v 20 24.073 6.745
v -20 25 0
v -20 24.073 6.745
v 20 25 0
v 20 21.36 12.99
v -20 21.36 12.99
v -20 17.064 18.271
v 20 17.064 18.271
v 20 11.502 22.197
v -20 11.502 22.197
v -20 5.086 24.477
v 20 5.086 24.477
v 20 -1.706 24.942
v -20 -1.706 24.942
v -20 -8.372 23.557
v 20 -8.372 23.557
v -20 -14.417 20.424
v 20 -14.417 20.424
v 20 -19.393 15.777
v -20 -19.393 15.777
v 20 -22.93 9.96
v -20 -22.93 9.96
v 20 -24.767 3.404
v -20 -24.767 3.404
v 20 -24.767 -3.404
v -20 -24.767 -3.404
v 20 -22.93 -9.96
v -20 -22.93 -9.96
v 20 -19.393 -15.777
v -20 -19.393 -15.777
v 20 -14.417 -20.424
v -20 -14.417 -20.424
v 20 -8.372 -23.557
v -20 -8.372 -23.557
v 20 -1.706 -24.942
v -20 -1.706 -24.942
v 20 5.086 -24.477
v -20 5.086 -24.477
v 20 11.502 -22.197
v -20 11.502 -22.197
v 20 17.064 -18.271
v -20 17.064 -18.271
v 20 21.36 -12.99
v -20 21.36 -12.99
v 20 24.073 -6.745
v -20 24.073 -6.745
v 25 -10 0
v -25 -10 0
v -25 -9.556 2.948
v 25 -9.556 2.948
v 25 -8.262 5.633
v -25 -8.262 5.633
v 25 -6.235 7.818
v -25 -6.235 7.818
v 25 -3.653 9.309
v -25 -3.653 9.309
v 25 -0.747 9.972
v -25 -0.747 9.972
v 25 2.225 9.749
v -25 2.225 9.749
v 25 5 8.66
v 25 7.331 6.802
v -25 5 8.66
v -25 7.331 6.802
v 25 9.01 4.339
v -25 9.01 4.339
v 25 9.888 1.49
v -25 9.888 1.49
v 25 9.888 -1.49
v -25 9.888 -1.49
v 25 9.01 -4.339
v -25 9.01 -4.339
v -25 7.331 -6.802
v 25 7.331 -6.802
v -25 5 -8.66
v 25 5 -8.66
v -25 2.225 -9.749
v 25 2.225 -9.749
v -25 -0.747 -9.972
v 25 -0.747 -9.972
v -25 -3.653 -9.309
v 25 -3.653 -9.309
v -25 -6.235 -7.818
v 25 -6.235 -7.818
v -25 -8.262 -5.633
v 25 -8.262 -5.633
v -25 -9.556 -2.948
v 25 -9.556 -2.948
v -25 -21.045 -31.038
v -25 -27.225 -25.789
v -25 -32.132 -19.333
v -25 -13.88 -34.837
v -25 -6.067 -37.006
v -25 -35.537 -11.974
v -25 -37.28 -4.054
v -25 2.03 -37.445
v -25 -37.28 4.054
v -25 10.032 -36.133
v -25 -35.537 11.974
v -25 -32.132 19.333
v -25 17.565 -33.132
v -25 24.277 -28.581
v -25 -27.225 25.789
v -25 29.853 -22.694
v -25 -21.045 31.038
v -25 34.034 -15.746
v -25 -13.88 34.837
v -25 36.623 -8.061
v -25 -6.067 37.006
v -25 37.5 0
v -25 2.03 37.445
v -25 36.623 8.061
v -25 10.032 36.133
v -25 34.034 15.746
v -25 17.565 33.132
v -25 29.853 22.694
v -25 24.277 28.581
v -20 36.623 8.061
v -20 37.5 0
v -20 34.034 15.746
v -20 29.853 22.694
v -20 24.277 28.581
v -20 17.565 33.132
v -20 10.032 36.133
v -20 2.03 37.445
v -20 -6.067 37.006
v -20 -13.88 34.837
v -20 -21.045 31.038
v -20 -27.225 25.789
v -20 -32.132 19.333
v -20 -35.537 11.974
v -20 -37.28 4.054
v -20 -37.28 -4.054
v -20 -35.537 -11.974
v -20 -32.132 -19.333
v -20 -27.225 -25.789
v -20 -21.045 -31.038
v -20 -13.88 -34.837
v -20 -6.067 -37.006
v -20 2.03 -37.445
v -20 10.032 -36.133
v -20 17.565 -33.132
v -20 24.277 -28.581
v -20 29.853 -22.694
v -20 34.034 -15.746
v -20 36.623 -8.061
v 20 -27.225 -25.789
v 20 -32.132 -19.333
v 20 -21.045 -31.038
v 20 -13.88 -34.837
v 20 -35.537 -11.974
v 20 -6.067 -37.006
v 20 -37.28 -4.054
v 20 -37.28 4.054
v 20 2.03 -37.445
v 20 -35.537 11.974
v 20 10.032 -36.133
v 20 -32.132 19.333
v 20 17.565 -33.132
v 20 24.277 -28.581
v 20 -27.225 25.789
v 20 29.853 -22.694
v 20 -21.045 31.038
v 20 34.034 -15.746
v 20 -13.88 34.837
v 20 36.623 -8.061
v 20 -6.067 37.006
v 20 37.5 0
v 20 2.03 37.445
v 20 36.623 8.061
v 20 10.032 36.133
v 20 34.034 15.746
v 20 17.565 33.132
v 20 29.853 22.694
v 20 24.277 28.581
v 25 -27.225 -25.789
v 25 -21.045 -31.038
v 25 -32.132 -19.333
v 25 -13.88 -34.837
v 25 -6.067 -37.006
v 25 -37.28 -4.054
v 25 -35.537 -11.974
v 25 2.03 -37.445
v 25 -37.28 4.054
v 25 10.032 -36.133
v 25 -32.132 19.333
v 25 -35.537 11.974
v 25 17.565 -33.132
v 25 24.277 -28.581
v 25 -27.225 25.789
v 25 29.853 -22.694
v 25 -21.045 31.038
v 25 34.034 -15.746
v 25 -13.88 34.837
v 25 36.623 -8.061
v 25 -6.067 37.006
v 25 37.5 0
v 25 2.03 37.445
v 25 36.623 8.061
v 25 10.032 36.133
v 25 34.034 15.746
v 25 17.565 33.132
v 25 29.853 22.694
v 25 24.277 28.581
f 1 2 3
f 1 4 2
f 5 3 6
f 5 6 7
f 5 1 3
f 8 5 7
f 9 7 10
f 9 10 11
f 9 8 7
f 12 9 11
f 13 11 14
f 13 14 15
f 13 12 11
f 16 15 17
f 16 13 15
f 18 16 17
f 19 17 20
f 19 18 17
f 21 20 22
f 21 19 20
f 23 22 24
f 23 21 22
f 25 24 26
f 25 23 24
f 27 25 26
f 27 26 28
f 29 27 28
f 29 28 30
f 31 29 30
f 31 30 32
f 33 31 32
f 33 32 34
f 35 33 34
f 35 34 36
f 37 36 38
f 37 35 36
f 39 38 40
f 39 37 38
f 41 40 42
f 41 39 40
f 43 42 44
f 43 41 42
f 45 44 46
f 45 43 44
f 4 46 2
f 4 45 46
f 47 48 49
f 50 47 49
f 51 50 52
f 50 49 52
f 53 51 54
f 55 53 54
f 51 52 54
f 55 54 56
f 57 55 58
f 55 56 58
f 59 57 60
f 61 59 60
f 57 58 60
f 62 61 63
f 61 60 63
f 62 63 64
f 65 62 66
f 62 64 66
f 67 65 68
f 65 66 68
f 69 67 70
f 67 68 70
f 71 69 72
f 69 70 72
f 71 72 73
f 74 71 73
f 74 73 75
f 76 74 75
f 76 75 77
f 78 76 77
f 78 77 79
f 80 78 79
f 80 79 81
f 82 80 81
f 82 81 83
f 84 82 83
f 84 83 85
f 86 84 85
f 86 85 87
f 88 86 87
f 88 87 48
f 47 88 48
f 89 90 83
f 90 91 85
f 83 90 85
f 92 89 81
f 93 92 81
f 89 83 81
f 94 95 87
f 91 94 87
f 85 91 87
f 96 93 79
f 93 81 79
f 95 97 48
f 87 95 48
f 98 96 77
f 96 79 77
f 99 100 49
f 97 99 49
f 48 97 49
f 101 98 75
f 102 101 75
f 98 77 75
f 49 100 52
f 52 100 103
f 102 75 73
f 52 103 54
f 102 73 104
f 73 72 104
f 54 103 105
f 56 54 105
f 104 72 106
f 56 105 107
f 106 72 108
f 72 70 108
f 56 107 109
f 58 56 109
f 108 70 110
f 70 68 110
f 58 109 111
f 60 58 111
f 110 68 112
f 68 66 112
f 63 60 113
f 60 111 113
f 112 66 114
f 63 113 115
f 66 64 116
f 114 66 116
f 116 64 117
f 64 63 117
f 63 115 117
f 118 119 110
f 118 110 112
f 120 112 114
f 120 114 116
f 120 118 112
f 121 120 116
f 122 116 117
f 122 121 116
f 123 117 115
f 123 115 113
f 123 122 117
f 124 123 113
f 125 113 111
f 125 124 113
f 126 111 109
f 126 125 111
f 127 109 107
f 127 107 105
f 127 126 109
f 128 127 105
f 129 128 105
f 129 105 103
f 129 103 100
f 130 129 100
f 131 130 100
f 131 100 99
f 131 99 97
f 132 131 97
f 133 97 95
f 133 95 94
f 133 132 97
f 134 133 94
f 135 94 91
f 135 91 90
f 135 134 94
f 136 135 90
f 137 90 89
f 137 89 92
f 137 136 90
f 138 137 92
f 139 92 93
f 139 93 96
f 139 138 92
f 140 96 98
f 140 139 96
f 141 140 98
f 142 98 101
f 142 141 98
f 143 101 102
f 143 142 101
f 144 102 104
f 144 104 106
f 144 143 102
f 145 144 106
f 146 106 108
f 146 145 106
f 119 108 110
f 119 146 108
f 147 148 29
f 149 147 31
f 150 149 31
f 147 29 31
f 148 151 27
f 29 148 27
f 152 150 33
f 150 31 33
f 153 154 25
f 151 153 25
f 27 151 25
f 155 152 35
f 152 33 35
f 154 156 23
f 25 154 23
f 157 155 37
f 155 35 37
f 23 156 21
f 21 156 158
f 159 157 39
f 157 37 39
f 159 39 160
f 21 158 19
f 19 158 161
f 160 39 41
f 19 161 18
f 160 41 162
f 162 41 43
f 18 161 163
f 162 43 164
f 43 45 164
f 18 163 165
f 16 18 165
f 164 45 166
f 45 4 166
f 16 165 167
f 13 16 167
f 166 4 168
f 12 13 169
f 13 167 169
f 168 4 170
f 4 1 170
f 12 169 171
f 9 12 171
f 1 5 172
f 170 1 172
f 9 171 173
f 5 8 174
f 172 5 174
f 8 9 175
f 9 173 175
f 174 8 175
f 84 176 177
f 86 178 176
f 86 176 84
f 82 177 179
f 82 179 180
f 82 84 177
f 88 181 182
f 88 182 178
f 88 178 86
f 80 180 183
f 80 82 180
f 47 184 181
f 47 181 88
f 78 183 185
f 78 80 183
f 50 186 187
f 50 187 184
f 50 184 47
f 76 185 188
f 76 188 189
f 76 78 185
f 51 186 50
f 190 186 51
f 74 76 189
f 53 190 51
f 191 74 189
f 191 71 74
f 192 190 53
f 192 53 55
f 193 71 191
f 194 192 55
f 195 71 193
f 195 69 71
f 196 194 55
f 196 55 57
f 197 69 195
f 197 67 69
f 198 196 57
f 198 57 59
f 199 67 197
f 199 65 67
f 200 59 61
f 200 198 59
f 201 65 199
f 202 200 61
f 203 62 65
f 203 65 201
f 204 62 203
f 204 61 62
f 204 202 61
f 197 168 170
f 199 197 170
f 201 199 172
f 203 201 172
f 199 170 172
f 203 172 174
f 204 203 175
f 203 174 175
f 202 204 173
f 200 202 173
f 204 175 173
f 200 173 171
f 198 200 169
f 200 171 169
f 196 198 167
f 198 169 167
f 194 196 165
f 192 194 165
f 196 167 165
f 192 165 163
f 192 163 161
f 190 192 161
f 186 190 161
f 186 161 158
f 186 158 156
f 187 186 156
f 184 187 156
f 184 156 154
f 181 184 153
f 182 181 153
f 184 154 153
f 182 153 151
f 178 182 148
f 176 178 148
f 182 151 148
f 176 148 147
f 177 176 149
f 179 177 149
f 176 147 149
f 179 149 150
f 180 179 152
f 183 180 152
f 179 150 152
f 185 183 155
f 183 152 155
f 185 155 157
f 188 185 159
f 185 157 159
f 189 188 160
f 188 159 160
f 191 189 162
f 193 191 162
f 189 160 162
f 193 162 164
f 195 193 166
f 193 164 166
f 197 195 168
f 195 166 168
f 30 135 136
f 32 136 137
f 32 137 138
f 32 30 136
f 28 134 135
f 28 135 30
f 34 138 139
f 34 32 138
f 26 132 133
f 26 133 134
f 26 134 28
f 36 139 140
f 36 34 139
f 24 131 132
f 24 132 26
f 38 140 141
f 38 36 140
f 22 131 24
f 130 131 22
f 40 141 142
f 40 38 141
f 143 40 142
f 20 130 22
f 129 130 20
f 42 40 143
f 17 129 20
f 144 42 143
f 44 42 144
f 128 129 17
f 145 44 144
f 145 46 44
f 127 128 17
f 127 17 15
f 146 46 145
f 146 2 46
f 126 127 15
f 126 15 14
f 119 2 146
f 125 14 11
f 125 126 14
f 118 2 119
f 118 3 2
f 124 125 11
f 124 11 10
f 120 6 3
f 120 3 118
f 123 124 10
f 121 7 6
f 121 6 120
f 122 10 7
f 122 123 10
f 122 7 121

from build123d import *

# Parameters (mm, degrees)
F0_R     = 25
F1_DEPTH = 20
F2_R     = 37.5
F2_R_2   = 25
F3_DEPTH = 5
F6_D     = 20
F6_DEPTH = 250


with BuildPart() as f1:
    # F0 (on Right) → F1 (new body)
    with BuildSketch(Plane.YZ):
        Circle(F0_R)
    extrude(amount=F1_DEPTH)

    # F2 (on face) → F3 (join)
    with BuildSketch(Plane.YZ.offset(20)):
        Circle(F2_R)
        Circle(F2_R_2, mode=Mode.SUBTRACT)
        Circle(F2_R_2)
    extrude(amount=F3_DEPTH)

    # F4: F1 across face


with BuildPart() as f1_1:
    add(f1.part)
    add(f1.part.mirror(Plane(origin=(0, 0, 0), x_dir=(0, 1, 0), z_dir=(-1, 0, 0))))

    # F6
    with Locations(Plane.YZ.offset(25)):
        with Locations((0, 0)):
            Hole(F6_D / 2, depth=F6_DEPTH)


solid = f1_1.part
